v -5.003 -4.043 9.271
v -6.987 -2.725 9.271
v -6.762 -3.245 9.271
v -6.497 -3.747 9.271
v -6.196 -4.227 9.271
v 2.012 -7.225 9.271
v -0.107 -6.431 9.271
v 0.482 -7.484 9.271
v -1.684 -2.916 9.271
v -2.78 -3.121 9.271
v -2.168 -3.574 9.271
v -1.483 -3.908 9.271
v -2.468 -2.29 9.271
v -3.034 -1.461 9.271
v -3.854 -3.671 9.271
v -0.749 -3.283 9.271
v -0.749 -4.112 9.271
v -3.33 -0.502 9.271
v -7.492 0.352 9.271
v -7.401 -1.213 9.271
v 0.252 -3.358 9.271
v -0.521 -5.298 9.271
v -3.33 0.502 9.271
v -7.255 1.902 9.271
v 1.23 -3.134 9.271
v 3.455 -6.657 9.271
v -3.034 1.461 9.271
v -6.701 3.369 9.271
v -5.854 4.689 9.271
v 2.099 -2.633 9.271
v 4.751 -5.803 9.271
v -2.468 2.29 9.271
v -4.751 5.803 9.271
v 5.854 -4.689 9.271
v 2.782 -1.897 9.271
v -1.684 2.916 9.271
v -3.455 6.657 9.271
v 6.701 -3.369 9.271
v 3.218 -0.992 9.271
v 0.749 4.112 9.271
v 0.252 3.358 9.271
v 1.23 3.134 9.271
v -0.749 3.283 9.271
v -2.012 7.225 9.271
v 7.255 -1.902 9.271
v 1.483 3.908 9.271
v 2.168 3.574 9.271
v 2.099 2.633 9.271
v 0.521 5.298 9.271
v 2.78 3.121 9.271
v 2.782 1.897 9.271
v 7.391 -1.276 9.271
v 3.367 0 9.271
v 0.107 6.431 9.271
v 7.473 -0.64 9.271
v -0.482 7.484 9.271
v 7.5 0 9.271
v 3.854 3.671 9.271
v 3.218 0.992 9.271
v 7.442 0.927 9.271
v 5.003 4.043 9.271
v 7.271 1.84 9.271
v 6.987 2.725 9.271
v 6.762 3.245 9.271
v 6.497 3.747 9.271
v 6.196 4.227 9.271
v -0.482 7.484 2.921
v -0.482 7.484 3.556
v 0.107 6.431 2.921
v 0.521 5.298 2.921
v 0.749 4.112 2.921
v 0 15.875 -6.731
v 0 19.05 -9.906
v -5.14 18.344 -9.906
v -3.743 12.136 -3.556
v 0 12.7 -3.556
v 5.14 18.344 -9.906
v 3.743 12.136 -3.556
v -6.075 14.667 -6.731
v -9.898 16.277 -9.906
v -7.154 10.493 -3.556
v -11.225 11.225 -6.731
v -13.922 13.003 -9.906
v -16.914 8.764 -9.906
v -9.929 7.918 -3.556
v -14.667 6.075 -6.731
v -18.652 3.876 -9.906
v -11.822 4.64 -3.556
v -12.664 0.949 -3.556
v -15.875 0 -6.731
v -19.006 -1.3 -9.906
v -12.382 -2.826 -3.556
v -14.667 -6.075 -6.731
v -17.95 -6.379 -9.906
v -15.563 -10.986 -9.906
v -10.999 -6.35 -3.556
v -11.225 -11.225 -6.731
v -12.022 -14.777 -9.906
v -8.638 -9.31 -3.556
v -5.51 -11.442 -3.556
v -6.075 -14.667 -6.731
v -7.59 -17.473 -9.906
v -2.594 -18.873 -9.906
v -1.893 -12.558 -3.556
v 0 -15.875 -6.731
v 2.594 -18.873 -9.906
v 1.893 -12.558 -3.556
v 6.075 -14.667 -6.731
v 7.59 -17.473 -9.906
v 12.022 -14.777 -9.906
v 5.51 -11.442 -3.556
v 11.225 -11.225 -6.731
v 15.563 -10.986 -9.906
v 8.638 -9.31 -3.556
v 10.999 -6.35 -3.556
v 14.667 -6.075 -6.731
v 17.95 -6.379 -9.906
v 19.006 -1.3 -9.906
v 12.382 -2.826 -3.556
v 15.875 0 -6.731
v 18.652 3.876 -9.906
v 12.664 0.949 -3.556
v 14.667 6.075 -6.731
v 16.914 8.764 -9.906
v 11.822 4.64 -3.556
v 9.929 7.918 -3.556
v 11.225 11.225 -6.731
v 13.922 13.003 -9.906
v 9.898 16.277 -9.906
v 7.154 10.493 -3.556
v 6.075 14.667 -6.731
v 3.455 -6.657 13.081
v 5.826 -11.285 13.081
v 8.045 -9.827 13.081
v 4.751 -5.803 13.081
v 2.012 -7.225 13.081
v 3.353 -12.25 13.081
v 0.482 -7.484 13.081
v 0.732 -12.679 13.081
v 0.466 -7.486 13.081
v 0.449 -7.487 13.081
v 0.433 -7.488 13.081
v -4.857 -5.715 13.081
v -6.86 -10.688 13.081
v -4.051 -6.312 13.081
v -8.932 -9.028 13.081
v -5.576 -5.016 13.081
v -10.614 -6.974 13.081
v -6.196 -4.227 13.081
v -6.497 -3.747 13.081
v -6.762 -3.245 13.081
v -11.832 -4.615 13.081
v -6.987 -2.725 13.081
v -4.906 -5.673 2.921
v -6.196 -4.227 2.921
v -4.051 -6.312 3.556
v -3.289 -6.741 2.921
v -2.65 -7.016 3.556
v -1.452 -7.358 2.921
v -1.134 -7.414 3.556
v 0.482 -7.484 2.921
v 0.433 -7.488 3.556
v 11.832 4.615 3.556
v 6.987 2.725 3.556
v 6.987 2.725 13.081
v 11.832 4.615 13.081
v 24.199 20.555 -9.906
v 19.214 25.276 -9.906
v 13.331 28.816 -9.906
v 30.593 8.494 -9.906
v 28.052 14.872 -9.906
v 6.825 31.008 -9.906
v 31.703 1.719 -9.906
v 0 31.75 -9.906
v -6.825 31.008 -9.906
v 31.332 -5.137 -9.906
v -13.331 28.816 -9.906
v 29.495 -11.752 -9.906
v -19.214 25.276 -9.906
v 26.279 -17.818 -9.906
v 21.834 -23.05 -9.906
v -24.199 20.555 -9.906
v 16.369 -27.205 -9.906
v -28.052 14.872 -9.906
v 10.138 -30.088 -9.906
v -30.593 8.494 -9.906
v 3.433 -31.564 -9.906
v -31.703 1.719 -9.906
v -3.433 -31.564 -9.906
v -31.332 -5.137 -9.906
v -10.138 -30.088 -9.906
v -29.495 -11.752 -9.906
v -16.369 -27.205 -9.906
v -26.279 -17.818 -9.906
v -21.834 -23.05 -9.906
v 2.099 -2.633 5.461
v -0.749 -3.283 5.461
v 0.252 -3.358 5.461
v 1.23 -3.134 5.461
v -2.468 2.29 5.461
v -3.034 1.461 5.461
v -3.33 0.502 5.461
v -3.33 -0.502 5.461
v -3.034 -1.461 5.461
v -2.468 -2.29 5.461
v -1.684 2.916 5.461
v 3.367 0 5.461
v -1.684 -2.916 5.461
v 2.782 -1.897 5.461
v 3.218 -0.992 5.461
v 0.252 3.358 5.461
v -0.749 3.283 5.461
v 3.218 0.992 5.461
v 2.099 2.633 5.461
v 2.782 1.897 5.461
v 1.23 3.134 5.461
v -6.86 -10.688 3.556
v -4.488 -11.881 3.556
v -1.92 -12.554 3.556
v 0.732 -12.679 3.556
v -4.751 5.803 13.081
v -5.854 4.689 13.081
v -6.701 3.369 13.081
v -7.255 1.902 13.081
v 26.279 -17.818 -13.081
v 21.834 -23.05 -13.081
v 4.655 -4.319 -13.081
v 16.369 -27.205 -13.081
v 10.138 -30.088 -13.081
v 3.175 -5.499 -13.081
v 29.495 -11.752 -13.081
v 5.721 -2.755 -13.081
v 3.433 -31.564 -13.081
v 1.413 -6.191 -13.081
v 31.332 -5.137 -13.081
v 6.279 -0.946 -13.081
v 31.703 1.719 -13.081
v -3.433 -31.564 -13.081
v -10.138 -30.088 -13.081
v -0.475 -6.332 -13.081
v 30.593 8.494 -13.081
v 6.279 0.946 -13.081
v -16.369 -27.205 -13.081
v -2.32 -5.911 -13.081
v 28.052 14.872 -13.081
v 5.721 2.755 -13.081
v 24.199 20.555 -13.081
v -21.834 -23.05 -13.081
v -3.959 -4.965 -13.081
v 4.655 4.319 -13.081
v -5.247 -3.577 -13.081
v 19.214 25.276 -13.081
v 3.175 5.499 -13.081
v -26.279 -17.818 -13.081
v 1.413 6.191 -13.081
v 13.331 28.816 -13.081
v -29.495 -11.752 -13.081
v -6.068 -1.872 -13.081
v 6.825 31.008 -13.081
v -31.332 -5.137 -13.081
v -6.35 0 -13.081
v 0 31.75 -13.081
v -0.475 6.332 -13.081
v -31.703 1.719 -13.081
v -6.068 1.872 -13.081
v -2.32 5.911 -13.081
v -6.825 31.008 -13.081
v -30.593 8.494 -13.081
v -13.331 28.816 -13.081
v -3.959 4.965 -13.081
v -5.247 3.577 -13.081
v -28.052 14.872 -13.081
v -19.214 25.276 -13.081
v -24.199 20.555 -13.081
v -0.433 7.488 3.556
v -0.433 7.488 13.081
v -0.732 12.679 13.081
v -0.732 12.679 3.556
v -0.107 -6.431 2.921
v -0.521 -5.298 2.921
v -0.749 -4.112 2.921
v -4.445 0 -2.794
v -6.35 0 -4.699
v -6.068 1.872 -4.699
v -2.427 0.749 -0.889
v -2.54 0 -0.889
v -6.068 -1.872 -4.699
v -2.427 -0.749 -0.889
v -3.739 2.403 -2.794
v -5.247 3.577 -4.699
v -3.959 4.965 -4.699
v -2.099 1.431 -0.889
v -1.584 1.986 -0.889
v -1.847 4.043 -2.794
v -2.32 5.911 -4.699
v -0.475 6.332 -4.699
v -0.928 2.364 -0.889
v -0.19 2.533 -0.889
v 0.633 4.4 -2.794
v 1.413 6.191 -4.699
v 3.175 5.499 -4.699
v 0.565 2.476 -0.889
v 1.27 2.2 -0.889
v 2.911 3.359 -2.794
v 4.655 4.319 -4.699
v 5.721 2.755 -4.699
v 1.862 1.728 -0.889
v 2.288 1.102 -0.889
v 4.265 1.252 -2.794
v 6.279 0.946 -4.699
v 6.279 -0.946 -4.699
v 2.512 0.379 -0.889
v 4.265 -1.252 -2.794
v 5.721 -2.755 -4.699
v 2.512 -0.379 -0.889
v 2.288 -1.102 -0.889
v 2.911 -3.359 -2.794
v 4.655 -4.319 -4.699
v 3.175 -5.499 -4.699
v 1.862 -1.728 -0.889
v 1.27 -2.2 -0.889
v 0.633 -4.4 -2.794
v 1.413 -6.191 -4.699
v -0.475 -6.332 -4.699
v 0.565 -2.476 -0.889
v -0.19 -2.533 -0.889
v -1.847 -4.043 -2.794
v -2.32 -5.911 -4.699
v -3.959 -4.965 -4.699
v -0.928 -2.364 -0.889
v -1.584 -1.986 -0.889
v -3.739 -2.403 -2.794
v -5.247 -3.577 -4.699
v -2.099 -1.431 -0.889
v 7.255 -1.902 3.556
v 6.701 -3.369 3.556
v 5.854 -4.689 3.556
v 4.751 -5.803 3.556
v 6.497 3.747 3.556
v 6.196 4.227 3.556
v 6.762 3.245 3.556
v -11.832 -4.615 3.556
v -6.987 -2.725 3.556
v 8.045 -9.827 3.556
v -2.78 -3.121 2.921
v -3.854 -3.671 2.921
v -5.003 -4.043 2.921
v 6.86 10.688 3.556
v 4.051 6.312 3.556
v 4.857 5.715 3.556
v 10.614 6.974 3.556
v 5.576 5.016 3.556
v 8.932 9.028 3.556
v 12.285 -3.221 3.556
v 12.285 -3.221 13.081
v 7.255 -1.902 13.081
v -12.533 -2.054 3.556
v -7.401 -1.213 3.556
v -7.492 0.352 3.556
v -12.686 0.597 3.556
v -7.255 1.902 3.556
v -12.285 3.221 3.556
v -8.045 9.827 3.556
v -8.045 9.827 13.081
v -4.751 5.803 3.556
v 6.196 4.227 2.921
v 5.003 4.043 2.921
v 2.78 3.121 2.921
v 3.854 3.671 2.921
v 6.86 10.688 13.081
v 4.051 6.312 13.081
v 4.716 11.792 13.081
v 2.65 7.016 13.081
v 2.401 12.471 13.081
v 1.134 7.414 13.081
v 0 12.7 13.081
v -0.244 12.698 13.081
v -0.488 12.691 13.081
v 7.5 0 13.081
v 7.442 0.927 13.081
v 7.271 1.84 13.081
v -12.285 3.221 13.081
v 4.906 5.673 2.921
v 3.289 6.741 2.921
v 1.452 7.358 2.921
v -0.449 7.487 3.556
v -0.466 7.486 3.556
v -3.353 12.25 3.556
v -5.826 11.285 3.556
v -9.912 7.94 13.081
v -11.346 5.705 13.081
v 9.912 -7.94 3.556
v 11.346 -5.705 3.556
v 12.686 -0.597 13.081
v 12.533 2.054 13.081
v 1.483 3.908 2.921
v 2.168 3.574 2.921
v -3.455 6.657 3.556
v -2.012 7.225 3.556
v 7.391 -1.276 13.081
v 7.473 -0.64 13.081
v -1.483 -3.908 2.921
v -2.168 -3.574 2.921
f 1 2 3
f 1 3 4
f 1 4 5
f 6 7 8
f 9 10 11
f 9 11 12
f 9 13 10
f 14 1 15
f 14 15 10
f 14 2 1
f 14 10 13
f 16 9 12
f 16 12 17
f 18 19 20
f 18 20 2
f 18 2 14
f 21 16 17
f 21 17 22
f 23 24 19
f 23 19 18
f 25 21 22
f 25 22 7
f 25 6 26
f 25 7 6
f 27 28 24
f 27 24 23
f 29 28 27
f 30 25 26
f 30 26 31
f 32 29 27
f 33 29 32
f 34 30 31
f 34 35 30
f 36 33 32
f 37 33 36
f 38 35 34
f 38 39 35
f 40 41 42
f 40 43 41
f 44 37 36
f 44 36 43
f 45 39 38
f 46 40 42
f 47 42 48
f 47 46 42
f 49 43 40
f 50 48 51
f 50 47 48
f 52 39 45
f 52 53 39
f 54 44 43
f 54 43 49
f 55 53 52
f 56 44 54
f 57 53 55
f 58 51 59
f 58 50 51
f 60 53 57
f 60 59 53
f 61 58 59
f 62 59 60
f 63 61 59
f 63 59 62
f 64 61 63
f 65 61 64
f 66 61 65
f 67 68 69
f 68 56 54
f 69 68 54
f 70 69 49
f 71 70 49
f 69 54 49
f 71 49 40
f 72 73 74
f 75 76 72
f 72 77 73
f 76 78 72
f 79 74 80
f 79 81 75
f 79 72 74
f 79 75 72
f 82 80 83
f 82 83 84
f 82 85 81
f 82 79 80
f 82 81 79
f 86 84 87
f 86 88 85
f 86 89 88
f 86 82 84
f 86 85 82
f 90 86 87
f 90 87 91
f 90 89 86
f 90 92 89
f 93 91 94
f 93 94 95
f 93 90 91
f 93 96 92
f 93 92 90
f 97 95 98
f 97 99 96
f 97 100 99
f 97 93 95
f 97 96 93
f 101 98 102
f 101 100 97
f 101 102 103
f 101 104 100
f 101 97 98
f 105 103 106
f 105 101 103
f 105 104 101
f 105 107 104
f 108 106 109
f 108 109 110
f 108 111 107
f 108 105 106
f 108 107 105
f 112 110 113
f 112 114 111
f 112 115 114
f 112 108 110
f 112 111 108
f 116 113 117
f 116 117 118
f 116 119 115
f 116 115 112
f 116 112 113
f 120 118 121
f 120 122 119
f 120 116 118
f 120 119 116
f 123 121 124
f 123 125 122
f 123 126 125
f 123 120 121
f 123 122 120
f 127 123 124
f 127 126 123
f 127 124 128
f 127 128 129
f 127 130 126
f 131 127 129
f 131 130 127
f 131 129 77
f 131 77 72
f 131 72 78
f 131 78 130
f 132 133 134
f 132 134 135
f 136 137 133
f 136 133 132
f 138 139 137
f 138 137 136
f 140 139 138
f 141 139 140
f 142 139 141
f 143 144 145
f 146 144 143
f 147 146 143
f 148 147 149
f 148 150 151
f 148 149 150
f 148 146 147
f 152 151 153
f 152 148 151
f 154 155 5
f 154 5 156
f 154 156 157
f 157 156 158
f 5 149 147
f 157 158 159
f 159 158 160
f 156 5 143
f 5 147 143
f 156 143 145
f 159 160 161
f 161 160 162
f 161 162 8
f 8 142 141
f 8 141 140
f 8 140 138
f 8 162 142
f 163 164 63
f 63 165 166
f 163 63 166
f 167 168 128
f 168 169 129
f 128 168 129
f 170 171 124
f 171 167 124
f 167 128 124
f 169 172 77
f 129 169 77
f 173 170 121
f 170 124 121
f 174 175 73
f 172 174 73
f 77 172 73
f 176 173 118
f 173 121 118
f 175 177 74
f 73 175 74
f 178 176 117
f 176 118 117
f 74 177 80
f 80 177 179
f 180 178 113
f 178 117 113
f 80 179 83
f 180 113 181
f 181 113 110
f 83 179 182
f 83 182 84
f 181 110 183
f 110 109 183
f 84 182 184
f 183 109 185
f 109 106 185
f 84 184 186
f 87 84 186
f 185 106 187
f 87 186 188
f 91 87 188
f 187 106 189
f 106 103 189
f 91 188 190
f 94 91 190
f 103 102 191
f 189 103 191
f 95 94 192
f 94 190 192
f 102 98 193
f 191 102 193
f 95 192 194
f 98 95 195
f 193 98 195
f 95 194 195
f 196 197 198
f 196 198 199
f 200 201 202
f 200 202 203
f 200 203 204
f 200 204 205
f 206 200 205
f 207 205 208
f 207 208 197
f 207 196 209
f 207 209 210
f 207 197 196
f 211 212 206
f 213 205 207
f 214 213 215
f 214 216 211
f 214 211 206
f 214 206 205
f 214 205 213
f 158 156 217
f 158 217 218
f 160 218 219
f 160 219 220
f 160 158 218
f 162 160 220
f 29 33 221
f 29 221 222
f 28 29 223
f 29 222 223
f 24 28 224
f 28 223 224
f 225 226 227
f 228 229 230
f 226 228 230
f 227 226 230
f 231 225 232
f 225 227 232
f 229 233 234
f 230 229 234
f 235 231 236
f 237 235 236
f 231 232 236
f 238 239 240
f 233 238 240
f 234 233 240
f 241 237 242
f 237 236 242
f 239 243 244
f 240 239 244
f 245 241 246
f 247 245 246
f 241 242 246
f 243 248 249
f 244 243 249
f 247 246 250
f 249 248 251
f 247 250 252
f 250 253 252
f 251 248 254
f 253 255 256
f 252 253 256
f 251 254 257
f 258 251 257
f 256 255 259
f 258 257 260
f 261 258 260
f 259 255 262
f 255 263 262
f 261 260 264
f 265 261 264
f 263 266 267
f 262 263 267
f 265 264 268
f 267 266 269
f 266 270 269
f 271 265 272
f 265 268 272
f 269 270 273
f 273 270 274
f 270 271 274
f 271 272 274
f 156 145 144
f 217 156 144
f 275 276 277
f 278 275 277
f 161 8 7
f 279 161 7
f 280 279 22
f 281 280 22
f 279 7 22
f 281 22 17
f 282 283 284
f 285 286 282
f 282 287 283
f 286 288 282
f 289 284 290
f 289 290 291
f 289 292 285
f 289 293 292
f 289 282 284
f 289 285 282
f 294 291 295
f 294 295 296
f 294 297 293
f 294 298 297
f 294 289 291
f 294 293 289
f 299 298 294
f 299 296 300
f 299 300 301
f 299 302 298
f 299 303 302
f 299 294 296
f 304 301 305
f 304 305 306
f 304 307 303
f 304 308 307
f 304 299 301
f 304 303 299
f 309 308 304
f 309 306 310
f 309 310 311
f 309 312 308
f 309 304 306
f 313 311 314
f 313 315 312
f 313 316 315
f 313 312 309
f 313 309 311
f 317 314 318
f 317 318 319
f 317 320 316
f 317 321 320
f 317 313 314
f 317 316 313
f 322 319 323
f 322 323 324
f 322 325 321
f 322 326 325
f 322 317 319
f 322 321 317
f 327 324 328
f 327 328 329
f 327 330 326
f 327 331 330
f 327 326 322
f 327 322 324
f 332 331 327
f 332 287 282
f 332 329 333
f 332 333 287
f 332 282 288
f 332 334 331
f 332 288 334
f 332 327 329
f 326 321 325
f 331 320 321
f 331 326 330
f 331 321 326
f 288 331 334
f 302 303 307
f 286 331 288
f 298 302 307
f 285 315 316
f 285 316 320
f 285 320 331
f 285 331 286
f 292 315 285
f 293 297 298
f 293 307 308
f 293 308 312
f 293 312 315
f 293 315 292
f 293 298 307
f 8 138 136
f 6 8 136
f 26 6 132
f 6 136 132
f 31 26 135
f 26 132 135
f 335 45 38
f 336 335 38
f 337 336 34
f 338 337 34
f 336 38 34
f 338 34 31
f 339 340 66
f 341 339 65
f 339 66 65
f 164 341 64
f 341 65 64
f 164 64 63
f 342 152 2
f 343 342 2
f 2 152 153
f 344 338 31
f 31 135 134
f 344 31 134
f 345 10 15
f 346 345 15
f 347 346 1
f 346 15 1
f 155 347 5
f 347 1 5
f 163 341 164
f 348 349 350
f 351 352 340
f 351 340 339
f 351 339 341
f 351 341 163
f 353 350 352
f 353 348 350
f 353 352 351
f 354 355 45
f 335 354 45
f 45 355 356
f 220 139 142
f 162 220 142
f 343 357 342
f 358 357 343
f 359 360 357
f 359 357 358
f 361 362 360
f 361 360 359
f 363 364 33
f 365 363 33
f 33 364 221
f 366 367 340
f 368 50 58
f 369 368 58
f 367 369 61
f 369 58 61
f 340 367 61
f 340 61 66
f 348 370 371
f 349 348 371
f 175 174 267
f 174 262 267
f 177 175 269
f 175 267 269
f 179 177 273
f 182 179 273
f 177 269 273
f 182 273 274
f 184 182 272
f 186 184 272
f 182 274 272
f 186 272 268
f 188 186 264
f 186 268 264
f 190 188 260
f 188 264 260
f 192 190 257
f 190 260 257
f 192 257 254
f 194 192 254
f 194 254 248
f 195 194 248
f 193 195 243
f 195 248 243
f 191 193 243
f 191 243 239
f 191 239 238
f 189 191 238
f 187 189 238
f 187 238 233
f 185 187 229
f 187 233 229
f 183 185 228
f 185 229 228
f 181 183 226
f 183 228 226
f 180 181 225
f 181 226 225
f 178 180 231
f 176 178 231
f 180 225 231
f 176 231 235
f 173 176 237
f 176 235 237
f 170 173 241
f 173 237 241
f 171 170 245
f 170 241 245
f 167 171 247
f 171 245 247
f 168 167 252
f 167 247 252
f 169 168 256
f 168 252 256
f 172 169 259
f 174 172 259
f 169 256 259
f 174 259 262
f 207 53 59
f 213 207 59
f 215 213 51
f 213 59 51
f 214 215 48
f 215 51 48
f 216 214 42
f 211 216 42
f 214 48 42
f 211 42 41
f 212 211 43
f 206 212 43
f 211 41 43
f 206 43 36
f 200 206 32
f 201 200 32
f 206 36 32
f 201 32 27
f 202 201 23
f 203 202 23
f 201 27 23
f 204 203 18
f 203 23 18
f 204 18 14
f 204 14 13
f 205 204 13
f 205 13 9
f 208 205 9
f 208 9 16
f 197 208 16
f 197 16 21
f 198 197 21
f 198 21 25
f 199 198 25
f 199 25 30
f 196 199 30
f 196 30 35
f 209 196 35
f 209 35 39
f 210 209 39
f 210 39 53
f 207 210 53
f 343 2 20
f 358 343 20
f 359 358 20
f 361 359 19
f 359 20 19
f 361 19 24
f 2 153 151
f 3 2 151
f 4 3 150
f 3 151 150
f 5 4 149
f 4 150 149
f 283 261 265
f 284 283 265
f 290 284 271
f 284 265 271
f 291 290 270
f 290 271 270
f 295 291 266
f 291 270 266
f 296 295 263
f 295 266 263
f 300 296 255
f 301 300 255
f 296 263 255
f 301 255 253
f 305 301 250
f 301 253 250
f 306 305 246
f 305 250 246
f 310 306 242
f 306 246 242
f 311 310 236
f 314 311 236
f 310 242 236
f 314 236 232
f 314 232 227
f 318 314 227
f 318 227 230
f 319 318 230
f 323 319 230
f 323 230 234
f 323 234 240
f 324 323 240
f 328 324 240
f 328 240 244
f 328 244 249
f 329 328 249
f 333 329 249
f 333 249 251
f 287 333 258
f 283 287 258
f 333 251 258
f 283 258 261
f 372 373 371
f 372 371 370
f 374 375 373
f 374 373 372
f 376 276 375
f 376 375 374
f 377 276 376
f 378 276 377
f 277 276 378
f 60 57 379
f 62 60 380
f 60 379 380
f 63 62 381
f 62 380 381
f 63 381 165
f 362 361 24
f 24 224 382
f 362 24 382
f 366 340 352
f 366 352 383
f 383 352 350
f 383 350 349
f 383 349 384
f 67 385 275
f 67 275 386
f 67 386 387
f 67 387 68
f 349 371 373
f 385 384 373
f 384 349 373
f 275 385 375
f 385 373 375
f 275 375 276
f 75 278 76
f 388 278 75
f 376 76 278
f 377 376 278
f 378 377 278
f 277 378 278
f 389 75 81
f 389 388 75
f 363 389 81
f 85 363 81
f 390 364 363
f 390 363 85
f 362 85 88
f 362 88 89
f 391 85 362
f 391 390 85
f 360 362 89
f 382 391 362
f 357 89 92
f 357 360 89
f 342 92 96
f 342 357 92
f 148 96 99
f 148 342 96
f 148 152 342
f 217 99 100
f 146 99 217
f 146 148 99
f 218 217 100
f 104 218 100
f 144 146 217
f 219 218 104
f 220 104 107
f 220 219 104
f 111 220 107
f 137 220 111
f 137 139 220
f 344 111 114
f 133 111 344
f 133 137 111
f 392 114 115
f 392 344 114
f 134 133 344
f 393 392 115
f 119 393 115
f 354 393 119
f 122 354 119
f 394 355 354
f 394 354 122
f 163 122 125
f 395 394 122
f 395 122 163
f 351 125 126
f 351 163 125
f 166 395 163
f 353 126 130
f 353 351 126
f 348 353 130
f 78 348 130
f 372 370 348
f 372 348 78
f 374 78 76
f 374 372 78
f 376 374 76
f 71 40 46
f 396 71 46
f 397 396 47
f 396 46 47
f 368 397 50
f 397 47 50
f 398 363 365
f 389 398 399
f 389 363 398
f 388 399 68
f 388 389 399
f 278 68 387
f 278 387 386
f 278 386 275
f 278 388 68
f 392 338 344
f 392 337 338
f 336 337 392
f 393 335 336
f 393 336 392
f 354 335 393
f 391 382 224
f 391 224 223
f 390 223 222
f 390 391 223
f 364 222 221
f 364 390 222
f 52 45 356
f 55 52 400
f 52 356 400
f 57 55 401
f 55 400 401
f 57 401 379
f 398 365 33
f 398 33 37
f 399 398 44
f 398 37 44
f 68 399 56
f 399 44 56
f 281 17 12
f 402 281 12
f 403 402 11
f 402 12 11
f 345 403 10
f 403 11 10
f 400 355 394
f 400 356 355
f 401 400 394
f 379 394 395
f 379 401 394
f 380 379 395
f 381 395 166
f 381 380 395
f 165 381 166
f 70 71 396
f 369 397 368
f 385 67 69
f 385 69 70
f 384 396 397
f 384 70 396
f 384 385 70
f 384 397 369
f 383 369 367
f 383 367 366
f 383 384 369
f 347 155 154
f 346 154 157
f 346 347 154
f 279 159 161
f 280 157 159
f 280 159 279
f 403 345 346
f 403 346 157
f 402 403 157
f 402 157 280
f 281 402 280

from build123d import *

# Parameters (mm, degrees)
SKETCH11_R          = 3.3672
CUT_EXTRUDE5_DEPTH  = 3.81
SKETCH11_5_R        = 3.3672
CUT_EXTRUDE7_DEPTH  = 7.62
CUT_EXTRUDE8_DEPTH  = 10.16
SKETCH13_R          = 6.35
CUT_EXTRUDE10_DEPTH = 12.192
CHAMFER1_SIZE       = 3.81
CHAMFER2_SIZE       = 6.35
CUT_EXTRUDE11_DEPTH = 9.525


with BuildPart() as part:
    # Sketch2 → Revolve1 (revolve)
    with BuildSketch(Plane(origin=(0, 0, 0), x_dir=(0, 0, -1), z_dir=(1, 0, 0))):
        Polygon((-13.081, 0), (-13.081, 9.525), (-13.081, 12.7), (-9.906, 12.7), (9.906, 12.7), (9.906, 31.75), (13.081, 31.75), (13.081, 0), align=None)
    revolve(axis=Axis((0, 0, -13.081), (0, 0, 1)))

    # Sketch11 → Cut-Extrude5 (cut)
    with BuildSketch(Plane.XY.offset(13.081)):
        with BuildLine():
            ThreePointArc((-6.195622147, -4.226614037), (-3.288572679, -6.740570431), (0.482036294, -7.48449337))
            ThreePointArc((0.482036294, -7.48449337), (-0.337099755, -5.872751112), (-0.749008883, -4.112345522))
            ThreePointArc((-0.749008883, -4.112345522), (-1.832831173, -3.756744587), (-2.78016744, -3.121388955))
            ThreePointArc((-2.78016744, -3.121388955), (-4.421160263, -3.880229865), (-6.195622147, -4.226614037))
        make_face()
        with BuildLine():
            ThreePointArc((7.5, 0), (7.166490288, 2.211654799), (6.195622147, 4.226614037))
            ThreePointArc((6.195622147, 4.226614037), (4.421160263, 3.880229865), (2.78016744, 3.121388955))
            ThreePointArc((2.78016744, 3.121388955), (1.832831173, 3.756744587), (0.749008883, 4.112345522))
            ThreePointArc((0.749008883, 4.112345522), (0.337099755, 5.872751112), (-0.482036294, 7.48449337))
            ThreePointArc((-0.482036294, 7.48449337), (-6.740570431, 3.288572679), (-6.195622147, -4.226614037))
            ThreePointArc((-6.195622147, -4.226614037), (-4.421160263, -3.880229865), (-2.78016744, -3.121388955))
            ThreePointArc((-2.78016744, -3.121388955), (-1.832831173, -3.756744587), (-0.749008883, -4.112345522))
            ThreePointArc((-0.749008883, -4.112345522), (-0.337099755, -5.872751112), (0.482036294, -7.48449337))
            ThreePointArc((0.482036294, -7.48449337), (5.471072665, -5.130045214), (7.5, 0))
        make_face()
        Circle(SKETCH11_R, mode=Mode.SUBTRACT)
        Circle(SKETCH11_R)
        with BuildLine():
            ThreePointArc((2.78016744, 3.121388955), (4.421160263, 3.880229865), (6.195622147, 4.226614037))
            ThreePointArc((6.195622147, 4.226614037), (3.288572679, 6.740570431), (-0.482036294, 7.48449337))
            ThreePointArc((-0.482036294, 7.48449337), (0.337099755, 5.872751112), (0.749008883, 4.112345522))
            ThreePointArc((0.749008883, 4.112345522), (1.832831173, 3.756744587), (2.78016744, 3.121388955))
        make_face()
    extrude(amount=-CUT_EXTRUDE5_DEPTH, mode=Mode.SUBTRACT)

    # Sketch11<5> → Cut-Extrude7 (cut)
    with BuildSketch(Plane.XY.offset(13.081)):
        Circle(SKETCH11_5_R)
    extrude(amount=-CUT_EXTRUDE7_DEPTH, mode=Mode.SUBTRACT)

    # Sketch11<6> → Cut-Extrude8 (cut)
    with BuildSketch(Plane.XY.offset(13.081)):
        with BuildLine():
            ThreePointArc((-6.195622147, -4.226614037), (-3.288572679, -6.740570431), (0.482036294, -7.48449337))
            ThreePointArc((0.482036294, -7.48449337), (-0.337099755, -5.872751112), (-0.749008883, -4.112345522))
            ThreePointArc((-0.749008883, -4.112345522), (-1.832831173, -3.756744587), (-2.78016744, -3.121388955))
            ThreePointArc((-2.78016744, -3.121388955), (-4.421160263, -3.880229865), (-6.195622147, -4.226614037))
        make_face()
        with BuildLine():
            ThreePointArc((2.78016744, 3.121388955), (4.421160263, 3.880229865), (6.195622147, 4.226614037))
            ThreePointArc((6.195622147, 4.226614037), (3.288572679, 6.740570431), (-0.482036294, 7.48449337))
            ThreePointArc((-0.482036294, 7.48449337), (0.337099755, 5.872751112), (0.749008883, 4.112345522))
            ThreePointArc((0.749008883, 4.112345522), (1.832831173, 3.756744587), (2.78016744, 3.121388955))
        make_face()
    extrude(amount=-CUT_EXTRUDE8_DEPTH, mode=Mode.SUBTRACT)

    # Sketch13 → Cut-Extrude10 (cut)
    with BuildSketch(Plane(origin=(0, 0, -13.081), x_dir=(-1, 0, 0), z_dir=(0, 0, -1))):
        Circle(SKETCH13_R)
    extrude(amount=-CUT_EXTRUDE10_DEPTH, mode=Mode.SUBTRACT)

    # Chamfer1
    chamfer1_edges = [part.edges().sort_by_distance(p)[0] for p in [
        (6.35, 0, -0.889),
    ]]
    chamfer(chamfer1_edges, length=CHAMFER1_SIZE)

    # Chamfer2
    chamfer2_edges = [part.edges().sort_by_distance(p)[0] for p in [
        (0, -12.7, -9.906),
    ]]
    chamfer(chamfer2_edges, length=CHAMFER2_SIZE)

    # Sketch14 → Cut-Extrude11 (cut)
    with BuildSketch(Plane.XY.offset(13.081)):
        with BuildLine():
            Line((-7.254714263, 1.902398741), (-12.284649485, 3.221395201))
            ThreePointArc((-12.284649485, 3.221395201), (-12.678861805, -0.732436563), (-11.831978794, -4.614572333))
            Line((-11.831978794, -4.614572333), (-6.987389052, -2.725141142))
            ThreePointArc((-6.987389052, -2.725141142), (-7.487516814, -0.432541277), (-7.254714263, 1.902398741))
        make_face()
        with BuildLine():
            ThreePointArc((-0.732436563, 12.678861805), (-4.614572333, 11.831978794), (-8.045001612, 9.82689926))
            Line((-8.045001612, 9.82689926), (-4.750985204, 5.803286965))
            ThreePointArc((-4.750985204, 5.803286965), (-2.725141142, 6.987389052), (-0.432541277, 7.487516814))
            Line((-0.432541277, 7.487516814), (-0.732436563, 12.678861805))
        make_face()
        with BuildLine():
            ThreePointArc((11.831978794, 4.614572333), (9.82689926, 8.045001612), (6.859894358, 10.68793008))
            Line((6.859894358, 10.68793008), (4.051118716, 6.311769732))
            ThreePointArc((4.051118716, 6.311769732), (5.803286965, 4.750985204), (6.987389052, 2.725141142))
            Line((6.987389052, 2.725141142), (11.831978794, 4.614572333))
        make_face()
        with BuildLine():
            Line((4.750985204, -5.803286965), (8.045001612, -9.82689926))
            ThreePointArc((8.045001612, -9.82689926), (10.68793008, -6.859894358), (12.284649485, -3.221395201))
            Line((12.284649485, -3.221395201), (7.254714263, -1.902398741))
            ThreePointArc((7.254714263, -1.902398741), (6.311769732, -4.051118716), (4.750985204, -5.803286965))
        make_face()
        with BuildLine():
            Line((-4.051118716, -6.311769732), (-6.859894358, -10.68793008))
            ThreePointArc((-6.859894358, -10.68793008), (-3.221395201, -12.284649485), (0.732436563, -12.678861805))
            Line((0.732436563, -12.678861805), (0.432541277, -7.487516814))
            ThreePointArc((0.432541277, -7.487516814), (-1.902398741, -7.254714263), (-4.051118716, -6.311769732))
        make_face()
    extrude(amount=-CUT_EXTRUDE11_DEPTH, mode=Mode.SUBTRACT)


solid = part.part
